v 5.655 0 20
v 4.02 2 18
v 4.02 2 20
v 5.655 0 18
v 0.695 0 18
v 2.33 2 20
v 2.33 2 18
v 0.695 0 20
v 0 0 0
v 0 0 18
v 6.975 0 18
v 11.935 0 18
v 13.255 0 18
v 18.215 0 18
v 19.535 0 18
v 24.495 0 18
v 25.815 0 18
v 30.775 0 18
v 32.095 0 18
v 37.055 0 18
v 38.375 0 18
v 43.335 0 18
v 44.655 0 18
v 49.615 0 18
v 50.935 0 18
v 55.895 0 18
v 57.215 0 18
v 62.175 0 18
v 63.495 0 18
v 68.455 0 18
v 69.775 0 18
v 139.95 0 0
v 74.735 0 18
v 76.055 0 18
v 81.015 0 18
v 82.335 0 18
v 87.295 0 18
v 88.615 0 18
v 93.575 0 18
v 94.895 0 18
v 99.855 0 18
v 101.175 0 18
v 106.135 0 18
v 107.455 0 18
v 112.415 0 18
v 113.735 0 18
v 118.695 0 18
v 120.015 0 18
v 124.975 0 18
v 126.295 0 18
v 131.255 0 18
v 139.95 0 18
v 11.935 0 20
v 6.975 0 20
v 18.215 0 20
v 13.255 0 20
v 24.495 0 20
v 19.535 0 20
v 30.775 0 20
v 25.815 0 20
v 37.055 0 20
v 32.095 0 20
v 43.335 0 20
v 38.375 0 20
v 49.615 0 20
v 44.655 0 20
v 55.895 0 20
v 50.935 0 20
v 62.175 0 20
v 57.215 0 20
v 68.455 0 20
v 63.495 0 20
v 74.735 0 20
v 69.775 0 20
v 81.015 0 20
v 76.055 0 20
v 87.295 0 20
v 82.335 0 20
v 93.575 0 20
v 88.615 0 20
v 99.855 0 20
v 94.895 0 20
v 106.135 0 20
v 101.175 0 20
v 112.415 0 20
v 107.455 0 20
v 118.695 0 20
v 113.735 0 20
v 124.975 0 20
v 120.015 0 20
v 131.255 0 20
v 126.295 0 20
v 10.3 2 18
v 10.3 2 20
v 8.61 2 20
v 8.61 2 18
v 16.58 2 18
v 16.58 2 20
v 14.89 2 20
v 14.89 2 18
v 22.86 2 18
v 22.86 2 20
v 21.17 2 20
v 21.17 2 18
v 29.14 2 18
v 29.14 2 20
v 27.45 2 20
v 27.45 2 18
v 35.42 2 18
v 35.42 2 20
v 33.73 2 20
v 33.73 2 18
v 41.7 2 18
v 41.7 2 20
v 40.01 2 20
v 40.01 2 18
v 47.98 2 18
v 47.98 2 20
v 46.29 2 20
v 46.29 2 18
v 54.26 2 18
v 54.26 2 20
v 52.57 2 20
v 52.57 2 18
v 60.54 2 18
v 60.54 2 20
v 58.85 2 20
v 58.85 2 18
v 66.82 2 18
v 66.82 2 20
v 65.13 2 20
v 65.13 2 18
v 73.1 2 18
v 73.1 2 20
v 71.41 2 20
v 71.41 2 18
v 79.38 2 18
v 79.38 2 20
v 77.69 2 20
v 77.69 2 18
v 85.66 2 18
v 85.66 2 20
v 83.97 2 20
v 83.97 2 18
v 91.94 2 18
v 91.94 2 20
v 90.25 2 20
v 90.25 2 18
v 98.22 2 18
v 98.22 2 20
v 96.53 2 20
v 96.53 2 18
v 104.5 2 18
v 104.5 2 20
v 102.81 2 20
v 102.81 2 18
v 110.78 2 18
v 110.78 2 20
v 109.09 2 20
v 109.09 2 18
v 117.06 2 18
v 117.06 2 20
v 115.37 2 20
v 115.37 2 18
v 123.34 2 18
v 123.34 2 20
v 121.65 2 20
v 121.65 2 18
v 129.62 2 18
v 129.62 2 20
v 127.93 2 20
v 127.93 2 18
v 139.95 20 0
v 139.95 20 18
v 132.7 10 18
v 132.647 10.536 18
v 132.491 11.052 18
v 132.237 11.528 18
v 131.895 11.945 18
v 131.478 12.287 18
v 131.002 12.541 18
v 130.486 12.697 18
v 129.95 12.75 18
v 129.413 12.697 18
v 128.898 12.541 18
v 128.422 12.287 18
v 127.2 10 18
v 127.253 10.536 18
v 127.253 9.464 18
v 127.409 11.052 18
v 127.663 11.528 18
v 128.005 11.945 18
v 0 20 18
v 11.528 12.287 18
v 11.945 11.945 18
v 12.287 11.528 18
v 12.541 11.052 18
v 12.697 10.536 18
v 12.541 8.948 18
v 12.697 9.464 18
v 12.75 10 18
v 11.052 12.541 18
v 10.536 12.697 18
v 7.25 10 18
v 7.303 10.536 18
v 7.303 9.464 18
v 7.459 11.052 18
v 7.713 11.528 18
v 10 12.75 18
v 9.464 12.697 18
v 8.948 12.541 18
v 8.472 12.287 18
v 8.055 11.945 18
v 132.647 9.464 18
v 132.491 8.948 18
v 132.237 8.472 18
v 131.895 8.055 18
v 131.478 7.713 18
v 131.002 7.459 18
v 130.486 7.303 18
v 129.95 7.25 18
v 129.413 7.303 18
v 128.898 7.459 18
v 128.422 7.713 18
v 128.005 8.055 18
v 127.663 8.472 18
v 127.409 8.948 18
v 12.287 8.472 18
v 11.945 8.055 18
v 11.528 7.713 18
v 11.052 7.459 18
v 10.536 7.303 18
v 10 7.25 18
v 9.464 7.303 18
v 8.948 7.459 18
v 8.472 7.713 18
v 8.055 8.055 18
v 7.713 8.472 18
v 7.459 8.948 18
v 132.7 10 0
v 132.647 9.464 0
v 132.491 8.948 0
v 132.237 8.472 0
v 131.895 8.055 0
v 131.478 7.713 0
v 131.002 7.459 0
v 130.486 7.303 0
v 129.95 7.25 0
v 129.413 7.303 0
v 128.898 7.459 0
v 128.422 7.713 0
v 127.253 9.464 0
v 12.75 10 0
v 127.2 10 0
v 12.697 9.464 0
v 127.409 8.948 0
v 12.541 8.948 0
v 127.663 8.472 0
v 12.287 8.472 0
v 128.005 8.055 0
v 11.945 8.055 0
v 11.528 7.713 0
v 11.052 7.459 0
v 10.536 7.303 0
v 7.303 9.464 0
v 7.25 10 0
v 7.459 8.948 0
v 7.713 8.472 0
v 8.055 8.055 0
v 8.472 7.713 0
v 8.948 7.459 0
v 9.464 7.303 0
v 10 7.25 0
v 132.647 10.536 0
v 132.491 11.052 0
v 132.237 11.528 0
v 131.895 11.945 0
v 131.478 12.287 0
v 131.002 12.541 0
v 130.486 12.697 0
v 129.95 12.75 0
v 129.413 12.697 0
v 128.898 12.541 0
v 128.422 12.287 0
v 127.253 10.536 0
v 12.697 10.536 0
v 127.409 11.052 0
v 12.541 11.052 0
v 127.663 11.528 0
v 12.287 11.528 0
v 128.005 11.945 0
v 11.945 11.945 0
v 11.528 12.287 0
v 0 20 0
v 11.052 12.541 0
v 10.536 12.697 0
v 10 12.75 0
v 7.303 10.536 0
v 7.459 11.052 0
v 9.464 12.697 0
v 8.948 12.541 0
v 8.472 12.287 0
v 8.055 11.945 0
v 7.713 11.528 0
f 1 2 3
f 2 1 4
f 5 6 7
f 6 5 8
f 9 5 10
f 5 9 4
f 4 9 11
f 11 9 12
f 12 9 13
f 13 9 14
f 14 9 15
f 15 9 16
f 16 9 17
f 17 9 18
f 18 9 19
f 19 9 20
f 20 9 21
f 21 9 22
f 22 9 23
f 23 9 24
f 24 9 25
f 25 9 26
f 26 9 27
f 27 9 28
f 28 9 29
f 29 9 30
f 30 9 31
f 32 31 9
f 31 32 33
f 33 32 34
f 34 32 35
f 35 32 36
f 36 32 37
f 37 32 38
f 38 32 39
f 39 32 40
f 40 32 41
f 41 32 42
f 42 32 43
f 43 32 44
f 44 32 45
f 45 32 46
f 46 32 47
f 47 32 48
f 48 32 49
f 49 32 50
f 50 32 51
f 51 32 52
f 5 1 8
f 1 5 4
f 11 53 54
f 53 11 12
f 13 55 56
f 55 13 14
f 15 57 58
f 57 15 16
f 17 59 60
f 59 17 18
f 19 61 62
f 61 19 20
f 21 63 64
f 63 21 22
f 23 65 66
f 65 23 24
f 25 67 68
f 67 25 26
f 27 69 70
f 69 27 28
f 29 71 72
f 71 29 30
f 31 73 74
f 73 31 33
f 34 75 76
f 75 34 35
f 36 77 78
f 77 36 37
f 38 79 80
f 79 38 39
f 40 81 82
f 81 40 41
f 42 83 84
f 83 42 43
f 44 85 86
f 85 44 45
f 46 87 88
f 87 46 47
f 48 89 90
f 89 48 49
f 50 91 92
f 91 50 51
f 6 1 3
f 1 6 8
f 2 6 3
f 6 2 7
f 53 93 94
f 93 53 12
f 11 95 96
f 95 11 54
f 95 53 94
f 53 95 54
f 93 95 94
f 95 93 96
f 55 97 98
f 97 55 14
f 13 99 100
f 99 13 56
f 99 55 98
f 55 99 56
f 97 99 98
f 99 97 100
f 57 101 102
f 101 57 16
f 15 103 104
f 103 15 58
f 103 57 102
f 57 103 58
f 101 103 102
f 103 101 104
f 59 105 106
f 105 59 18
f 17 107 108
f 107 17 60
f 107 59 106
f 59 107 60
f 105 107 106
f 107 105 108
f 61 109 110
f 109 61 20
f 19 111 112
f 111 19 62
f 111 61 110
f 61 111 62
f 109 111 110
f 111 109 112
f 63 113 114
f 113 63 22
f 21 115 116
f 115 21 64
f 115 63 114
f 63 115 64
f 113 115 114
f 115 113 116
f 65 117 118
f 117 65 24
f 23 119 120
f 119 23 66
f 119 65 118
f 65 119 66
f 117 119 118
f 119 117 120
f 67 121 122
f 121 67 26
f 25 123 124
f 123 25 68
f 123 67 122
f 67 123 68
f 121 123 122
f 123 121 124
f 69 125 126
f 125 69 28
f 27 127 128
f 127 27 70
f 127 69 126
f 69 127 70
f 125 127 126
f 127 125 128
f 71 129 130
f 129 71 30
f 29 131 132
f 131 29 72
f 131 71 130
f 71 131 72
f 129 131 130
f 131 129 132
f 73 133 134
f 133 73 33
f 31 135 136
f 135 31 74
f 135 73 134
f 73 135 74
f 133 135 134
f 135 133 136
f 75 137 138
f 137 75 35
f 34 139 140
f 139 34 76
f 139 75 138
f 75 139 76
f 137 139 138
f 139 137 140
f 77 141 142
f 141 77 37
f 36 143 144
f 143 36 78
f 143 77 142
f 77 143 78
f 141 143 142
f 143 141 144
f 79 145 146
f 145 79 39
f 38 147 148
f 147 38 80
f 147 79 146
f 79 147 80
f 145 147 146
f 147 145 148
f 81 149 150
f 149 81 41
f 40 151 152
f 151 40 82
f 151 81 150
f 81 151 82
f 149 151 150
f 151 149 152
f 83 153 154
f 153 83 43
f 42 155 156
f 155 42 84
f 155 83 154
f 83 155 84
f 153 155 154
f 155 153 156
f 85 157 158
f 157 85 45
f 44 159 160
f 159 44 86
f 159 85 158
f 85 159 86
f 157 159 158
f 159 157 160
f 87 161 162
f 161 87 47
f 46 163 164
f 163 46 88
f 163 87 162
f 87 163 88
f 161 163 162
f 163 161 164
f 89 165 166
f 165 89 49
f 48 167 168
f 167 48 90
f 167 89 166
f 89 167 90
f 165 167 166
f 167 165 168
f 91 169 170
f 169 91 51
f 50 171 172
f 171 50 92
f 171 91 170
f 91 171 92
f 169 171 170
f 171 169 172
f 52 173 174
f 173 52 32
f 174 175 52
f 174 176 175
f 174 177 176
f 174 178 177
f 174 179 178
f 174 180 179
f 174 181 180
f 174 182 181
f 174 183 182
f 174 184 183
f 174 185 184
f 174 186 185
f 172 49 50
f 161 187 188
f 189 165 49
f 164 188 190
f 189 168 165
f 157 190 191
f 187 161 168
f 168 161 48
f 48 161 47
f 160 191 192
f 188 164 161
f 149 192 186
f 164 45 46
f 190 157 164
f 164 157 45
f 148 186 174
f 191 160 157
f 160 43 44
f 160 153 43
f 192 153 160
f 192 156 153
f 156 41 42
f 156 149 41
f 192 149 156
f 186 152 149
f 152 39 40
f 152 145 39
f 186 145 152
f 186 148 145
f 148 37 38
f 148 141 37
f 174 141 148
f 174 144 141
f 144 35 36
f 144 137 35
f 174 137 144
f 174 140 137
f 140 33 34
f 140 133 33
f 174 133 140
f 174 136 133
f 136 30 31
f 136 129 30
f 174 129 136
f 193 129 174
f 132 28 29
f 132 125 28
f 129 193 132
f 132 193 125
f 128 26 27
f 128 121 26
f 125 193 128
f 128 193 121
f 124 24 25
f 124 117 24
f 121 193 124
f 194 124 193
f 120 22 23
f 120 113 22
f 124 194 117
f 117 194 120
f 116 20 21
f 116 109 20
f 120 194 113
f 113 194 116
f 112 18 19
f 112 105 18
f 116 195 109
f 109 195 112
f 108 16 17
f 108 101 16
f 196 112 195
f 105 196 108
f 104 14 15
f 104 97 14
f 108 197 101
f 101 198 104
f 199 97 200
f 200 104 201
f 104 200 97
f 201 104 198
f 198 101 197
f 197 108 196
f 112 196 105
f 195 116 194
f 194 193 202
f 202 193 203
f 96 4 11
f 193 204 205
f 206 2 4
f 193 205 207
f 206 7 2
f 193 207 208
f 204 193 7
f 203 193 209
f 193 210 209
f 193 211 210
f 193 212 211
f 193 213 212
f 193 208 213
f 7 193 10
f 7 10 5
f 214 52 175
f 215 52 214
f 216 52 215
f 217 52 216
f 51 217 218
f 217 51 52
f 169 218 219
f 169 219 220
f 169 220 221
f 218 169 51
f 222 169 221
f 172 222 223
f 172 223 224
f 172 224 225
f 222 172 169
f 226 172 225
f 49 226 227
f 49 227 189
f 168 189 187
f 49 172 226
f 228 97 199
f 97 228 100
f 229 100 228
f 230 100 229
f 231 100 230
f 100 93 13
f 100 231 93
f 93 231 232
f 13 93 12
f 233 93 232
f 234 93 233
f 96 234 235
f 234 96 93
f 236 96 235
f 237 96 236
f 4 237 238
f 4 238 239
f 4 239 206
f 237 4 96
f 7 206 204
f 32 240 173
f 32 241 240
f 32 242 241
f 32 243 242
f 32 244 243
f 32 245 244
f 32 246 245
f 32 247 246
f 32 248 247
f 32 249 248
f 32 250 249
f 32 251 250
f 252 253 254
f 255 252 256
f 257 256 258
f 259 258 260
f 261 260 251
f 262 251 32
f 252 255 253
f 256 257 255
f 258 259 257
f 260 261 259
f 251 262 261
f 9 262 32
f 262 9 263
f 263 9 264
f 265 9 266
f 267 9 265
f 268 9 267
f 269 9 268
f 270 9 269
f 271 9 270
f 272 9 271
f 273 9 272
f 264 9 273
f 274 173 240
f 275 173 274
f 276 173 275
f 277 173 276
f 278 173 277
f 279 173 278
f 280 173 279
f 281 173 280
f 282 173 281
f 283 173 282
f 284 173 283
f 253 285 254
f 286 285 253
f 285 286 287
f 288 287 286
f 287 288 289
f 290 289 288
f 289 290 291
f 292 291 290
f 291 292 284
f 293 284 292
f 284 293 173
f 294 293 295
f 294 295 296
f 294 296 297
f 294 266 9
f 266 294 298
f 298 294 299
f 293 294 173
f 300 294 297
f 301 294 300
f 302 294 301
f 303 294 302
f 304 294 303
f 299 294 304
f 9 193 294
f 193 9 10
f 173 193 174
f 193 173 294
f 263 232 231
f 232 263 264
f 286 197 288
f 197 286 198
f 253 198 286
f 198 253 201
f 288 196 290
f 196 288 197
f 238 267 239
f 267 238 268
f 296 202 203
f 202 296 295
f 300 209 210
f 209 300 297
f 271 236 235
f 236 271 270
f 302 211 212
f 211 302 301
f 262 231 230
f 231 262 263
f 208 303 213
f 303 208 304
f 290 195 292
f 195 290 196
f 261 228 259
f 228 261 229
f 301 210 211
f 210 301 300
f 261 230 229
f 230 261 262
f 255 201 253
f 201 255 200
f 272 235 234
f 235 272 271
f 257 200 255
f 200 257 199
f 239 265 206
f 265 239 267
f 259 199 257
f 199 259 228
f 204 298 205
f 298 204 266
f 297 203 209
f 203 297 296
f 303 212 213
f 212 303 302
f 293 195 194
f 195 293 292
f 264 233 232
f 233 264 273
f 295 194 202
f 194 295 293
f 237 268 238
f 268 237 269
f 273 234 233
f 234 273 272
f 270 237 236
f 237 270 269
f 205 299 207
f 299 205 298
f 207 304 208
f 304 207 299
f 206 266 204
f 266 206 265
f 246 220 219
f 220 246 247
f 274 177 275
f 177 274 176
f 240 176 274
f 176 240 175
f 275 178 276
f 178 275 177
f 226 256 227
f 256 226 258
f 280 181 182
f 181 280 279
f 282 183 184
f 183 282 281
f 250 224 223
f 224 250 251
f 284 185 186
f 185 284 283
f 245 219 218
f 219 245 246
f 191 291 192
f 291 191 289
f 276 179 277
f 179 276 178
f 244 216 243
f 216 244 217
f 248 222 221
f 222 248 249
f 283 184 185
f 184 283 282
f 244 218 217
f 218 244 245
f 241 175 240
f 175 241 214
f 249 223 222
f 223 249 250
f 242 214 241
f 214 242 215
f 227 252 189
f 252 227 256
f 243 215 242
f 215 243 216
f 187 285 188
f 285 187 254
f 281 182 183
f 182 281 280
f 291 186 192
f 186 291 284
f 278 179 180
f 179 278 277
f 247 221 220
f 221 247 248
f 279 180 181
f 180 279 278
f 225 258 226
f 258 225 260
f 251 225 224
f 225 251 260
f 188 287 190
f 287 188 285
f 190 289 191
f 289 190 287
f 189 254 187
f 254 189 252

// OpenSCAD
$fn = 32;

// ----------------------------------------------------------------------
// Gear rack: m=2 z=21, 139.95 x 20 x 20 mm
// ----------------------------------------------------------------------

// --- parameters (mm) ---
bar_len = 139.95;         // rack length, X
bar_w = 20;               // rack width, Y
bar_h = 20;               // overall height, Z
gear_module = 2;          // module
base_t = 18;              // tooth root line height
pitch = 6.28;             // circular pitch
tip_w = 1.69;             // tooth thickness at the tip
root_w = 4.96;            // tooth thickness at the root line
hole_d = 5.5;             // mounting hole
sink = 0.6;               // tooth root overlap into the body

tooth_span = 131.95;

module tooth(x0) {
  /* 20 deg flank profile, sunk into the body for a positive overlap */
  translate([x0, 0, base_t - sink])
    linear_extrude(height = bar_h - base_t + sink)
      polygon(points = [[-root_w / 2, 0], [root_w / 2, 0],
                        [tip_w / 2, bar_h - base_t],
                        [-tip_w / 2, bar_h - base_t]]);
}

difference() {
  union() {
    cube([bar_len, bar_w, base_t]);
    for (i = [0 : 21 - 1])
      tooth((i + 0.5) * pitch + (tooth_span - 21 * pitch) / 2);
  }
  translate([10, 10, -1]) cylinder(h = base_t + 2, d = hole_d);
  translate([129.95, 10, -1]) cylinder(h = base_t + 2, d = hole_d);
}
